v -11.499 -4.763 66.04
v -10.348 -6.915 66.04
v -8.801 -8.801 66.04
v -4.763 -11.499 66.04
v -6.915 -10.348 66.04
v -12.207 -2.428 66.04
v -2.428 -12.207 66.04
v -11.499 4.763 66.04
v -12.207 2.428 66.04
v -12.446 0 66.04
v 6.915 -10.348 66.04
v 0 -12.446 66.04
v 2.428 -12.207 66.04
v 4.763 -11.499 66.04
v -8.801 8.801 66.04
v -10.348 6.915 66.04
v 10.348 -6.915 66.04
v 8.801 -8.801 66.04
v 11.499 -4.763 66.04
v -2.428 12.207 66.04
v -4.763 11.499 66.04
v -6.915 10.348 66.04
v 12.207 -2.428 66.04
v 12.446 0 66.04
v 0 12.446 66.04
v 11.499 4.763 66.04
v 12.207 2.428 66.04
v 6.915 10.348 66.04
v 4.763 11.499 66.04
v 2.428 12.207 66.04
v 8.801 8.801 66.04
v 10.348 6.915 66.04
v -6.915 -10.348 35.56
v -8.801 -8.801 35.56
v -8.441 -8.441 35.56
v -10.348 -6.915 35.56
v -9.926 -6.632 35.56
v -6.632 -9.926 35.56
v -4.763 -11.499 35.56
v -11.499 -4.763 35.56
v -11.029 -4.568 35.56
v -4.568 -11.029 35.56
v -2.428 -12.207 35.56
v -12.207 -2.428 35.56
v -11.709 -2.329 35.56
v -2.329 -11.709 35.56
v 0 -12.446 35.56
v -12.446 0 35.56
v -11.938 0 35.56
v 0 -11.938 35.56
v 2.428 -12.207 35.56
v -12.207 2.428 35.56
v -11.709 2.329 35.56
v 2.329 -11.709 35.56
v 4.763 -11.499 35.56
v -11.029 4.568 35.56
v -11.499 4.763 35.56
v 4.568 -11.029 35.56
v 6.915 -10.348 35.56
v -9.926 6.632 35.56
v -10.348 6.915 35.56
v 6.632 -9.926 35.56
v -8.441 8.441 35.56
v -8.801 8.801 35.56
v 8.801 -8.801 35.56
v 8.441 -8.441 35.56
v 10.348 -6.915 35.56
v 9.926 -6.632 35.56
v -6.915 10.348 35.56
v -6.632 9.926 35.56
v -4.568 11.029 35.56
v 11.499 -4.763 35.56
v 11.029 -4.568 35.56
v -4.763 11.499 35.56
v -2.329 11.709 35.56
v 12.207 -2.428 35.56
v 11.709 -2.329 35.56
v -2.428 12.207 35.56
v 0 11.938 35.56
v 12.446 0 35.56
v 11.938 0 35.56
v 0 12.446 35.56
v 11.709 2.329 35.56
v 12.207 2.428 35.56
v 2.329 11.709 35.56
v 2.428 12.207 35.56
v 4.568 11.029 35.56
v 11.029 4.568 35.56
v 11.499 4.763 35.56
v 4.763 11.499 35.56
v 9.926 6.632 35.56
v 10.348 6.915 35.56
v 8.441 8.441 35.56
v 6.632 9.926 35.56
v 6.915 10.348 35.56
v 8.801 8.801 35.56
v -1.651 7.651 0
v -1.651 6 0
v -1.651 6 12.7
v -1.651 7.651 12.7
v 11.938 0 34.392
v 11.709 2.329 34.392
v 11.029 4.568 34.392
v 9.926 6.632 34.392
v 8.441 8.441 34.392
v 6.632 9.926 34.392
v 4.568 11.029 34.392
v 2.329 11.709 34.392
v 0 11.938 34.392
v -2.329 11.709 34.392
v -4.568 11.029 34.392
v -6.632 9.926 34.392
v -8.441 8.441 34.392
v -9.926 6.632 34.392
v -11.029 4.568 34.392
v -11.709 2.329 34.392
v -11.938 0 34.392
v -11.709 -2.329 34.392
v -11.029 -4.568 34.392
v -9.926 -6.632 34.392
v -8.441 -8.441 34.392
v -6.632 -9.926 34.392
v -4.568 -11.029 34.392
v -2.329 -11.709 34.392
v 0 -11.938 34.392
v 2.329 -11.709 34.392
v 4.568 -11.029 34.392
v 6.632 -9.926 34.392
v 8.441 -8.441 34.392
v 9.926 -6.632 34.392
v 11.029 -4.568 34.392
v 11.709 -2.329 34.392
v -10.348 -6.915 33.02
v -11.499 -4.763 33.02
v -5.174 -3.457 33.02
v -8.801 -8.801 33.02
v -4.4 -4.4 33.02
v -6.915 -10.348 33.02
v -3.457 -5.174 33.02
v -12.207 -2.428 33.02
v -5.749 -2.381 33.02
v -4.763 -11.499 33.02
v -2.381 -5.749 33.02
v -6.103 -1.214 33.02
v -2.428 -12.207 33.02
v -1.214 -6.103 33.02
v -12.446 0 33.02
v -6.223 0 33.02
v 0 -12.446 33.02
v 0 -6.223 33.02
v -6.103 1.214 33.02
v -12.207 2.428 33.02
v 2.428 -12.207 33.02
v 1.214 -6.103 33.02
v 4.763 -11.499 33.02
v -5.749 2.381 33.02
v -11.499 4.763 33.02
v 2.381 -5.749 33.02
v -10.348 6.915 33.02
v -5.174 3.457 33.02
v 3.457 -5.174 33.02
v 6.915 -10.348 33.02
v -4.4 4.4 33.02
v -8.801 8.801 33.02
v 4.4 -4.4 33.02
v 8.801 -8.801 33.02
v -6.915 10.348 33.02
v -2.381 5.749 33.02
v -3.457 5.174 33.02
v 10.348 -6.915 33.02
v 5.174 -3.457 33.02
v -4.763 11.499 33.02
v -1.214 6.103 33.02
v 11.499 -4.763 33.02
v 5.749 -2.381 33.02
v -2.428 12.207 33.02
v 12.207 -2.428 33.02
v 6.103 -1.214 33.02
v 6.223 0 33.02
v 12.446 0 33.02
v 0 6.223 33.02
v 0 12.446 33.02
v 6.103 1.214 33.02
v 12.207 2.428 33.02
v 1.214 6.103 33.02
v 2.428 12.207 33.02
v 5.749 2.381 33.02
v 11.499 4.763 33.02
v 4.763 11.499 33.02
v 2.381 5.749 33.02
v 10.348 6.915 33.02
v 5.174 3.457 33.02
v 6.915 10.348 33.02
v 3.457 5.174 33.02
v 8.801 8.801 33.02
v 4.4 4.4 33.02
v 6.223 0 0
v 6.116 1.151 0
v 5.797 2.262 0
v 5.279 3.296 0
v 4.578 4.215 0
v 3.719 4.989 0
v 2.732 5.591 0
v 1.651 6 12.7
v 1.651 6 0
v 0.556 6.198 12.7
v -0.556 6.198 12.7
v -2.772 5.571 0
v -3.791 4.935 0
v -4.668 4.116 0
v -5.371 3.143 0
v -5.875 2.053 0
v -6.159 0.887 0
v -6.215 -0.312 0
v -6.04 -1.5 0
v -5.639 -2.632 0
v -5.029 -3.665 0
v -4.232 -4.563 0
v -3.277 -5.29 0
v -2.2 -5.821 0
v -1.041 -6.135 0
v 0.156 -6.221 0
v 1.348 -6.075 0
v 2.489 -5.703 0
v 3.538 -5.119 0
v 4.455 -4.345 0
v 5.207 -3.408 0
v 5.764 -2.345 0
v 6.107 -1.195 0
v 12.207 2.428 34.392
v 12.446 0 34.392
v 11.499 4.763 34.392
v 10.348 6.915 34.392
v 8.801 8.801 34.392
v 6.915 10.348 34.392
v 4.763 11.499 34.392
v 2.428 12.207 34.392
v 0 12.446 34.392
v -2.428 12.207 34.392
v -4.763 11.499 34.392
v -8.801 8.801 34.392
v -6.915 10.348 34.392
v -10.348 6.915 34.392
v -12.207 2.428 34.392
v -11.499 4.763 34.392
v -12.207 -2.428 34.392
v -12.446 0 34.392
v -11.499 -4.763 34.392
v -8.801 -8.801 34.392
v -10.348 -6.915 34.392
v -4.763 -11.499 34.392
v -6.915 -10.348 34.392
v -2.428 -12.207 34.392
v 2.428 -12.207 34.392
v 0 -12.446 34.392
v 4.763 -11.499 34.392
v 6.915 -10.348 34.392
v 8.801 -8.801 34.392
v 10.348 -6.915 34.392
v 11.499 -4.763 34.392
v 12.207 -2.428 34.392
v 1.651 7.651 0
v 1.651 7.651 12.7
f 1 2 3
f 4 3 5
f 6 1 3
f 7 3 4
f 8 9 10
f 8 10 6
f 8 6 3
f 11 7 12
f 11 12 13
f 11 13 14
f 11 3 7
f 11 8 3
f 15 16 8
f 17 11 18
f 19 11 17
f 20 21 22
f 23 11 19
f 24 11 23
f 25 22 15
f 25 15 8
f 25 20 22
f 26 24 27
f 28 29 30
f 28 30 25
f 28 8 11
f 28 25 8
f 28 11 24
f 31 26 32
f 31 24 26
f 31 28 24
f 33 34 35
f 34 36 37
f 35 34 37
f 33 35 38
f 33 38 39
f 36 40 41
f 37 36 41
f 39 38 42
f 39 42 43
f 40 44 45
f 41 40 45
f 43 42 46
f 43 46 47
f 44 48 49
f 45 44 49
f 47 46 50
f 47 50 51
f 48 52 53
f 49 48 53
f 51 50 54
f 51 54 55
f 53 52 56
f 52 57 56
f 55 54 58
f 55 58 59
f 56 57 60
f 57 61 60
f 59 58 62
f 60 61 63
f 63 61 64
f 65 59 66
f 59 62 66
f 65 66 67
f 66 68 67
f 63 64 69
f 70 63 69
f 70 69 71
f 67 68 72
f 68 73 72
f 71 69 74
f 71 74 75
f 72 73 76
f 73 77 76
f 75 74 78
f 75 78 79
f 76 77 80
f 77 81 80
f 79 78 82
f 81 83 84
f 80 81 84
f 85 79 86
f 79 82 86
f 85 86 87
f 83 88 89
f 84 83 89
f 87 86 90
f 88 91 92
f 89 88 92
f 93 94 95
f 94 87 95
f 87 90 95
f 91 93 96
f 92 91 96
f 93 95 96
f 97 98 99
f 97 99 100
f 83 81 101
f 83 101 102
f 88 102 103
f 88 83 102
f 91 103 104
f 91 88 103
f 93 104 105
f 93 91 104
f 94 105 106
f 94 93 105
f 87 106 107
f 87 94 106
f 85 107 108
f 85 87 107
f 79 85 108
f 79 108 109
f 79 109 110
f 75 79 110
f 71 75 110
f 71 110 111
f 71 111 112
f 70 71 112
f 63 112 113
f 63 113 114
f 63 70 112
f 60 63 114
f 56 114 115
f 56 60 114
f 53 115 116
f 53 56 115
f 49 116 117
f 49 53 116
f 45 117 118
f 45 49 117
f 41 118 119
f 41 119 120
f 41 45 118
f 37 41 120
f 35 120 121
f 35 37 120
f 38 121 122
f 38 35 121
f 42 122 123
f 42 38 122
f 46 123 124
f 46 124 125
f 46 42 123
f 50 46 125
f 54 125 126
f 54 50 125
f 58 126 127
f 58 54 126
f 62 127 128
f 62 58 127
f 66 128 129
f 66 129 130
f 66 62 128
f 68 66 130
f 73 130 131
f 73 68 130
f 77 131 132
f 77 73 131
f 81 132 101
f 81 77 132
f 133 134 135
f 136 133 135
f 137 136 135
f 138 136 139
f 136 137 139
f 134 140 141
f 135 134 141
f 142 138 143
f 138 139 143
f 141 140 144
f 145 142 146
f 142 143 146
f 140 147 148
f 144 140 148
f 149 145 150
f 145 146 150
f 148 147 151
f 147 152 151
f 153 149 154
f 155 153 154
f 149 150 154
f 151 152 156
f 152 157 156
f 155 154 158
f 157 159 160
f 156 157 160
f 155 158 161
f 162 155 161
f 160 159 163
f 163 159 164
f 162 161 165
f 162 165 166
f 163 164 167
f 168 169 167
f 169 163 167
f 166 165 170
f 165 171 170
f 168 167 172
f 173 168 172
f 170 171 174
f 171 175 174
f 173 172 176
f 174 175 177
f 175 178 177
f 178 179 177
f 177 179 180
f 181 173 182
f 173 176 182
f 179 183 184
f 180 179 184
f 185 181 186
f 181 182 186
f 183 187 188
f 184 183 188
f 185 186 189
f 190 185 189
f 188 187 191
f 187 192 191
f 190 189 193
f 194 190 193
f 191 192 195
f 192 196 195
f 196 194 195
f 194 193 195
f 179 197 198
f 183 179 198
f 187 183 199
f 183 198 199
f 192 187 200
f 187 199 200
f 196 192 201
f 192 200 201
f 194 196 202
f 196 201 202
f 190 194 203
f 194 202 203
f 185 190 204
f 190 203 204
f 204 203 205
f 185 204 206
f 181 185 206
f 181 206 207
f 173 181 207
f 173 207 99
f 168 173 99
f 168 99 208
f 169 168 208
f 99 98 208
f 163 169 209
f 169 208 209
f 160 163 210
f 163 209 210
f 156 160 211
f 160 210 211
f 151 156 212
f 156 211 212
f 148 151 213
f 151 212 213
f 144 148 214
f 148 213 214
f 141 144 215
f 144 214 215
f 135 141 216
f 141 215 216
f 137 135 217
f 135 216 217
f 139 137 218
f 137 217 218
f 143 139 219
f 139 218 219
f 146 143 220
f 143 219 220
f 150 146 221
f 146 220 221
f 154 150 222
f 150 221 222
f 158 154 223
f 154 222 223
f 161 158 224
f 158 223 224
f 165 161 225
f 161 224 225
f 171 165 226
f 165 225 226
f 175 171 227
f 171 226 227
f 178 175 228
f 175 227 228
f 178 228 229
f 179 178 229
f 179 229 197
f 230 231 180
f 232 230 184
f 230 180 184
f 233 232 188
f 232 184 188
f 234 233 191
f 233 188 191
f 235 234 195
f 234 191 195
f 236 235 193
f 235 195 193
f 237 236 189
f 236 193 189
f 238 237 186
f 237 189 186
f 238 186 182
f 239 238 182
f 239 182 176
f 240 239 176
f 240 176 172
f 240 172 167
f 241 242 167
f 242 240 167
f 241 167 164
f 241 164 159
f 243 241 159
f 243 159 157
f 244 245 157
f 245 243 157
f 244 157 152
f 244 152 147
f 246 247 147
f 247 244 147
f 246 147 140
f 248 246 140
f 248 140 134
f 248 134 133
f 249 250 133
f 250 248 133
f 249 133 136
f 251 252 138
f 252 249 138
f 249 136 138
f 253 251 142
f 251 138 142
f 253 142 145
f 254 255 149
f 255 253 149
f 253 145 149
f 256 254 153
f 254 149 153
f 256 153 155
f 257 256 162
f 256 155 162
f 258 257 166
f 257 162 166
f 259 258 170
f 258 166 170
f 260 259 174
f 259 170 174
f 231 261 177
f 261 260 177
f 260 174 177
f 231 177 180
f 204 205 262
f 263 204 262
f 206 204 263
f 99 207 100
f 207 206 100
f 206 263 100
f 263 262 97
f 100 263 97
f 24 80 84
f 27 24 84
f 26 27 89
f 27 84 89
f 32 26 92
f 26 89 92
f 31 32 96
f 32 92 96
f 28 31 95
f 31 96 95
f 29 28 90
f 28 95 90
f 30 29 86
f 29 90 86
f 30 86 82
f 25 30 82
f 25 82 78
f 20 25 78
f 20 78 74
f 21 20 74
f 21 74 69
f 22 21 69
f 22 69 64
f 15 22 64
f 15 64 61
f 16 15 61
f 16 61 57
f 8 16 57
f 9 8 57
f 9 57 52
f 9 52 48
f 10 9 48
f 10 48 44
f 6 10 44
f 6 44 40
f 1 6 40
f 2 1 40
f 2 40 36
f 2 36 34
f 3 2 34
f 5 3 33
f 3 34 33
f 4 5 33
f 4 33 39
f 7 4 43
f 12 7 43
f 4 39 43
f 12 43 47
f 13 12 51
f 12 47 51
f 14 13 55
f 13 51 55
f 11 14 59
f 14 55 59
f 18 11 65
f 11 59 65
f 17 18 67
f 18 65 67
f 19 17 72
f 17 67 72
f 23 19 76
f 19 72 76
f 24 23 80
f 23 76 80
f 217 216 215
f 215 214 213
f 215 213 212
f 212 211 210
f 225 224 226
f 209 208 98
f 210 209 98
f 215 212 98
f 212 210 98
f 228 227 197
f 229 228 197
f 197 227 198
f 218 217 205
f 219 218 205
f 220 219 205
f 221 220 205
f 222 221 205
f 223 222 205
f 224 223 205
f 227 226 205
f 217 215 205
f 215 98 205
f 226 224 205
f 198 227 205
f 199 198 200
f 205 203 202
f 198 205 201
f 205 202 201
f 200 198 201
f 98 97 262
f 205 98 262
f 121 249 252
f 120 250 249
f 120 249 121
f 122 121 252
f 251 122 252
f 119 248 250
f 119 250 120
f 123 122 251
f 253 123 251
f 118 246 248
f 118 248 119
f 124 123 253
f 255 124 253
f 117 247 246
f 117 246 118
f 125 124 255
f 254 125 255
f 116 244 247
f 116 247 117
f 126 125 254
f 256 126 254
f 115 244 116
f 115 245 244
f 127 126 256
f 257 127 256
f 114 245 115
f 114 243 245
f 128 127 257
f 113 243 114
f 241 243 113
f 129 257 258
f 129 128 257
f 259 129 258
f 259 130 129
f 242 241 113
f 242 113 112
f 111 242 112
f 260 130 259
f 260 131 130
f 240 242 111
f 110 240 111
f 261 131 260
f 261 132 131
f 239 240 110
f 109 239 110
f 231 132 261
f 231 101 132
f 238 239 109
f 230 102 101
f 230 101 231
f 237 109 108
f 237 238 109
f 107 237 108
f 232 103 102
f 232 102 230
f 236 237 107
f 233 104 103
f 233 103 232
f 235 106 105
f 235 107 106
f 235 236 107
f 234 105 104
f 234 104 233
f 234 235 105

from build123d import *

# Parameters (mm, degrees)
SKETCH1_R           = 6.223
BOSS_EXTRUDE1_DEPTH = 33.02
SKETCH2_R           = 12.446
BOSS_EXTRUDE2_DEPTH = 33.02
SKETCH3_W           = 3.302
SKETCH3_H           = 3.302
BOSS_EXTRUDE3_DEPTH = 12.7
SKETCH4_R           = 11.938
CUT_EXTRUDE1_DEPTH  = 1.1684


with BuildPart() as part:
    # Sketch1 → Boss-Extrude1 (new body)
    with BuildSketch(Plane.XY):
        Circle(SKETCH1_R)
    extrude(amount=BOSS_EXTRUDE1_DEPTH)

    # Sketch2 → Boss-Extrude2 (add)
    with BuildSketch(Plane.XY.offset(33.02)):
        Circle(SKETCH2_R)
    extrude(amount=BOSS_EXTRUDE2_DEPTH)

    # Sketch3 → Boss-Extrude3 (add)
    with BuildSketch(Plane(origin=(0, 0, 0), x_dir=(-1, 0, 0), z_dir=(0, 0, -1))):
        with Locations((0, 5.999994)):
            Rectangle(SKETCH3_W, SKETCH3_H)
    extrude(amount=-BOSS_EXTRUDE3_DEPTH)

    # Sketch4 → Cut-Extrude1 (cut)
    with BuildSketch(Plane.XY.offset(35.56)):
        Polygon((-17.203352379, 15.291868781), (-17.203352379, -16.384145123), (20.97667065, -17.277825766), (19.785096459, 16.68203867), align=None)
        Circle(SKETCH4_R, mode=Mode.SUBTRACT)
    extrude(amount=-CUT_EXTRUDE1_DEPTH, mode=Mode.SUBTRACT)


solid = part.part
